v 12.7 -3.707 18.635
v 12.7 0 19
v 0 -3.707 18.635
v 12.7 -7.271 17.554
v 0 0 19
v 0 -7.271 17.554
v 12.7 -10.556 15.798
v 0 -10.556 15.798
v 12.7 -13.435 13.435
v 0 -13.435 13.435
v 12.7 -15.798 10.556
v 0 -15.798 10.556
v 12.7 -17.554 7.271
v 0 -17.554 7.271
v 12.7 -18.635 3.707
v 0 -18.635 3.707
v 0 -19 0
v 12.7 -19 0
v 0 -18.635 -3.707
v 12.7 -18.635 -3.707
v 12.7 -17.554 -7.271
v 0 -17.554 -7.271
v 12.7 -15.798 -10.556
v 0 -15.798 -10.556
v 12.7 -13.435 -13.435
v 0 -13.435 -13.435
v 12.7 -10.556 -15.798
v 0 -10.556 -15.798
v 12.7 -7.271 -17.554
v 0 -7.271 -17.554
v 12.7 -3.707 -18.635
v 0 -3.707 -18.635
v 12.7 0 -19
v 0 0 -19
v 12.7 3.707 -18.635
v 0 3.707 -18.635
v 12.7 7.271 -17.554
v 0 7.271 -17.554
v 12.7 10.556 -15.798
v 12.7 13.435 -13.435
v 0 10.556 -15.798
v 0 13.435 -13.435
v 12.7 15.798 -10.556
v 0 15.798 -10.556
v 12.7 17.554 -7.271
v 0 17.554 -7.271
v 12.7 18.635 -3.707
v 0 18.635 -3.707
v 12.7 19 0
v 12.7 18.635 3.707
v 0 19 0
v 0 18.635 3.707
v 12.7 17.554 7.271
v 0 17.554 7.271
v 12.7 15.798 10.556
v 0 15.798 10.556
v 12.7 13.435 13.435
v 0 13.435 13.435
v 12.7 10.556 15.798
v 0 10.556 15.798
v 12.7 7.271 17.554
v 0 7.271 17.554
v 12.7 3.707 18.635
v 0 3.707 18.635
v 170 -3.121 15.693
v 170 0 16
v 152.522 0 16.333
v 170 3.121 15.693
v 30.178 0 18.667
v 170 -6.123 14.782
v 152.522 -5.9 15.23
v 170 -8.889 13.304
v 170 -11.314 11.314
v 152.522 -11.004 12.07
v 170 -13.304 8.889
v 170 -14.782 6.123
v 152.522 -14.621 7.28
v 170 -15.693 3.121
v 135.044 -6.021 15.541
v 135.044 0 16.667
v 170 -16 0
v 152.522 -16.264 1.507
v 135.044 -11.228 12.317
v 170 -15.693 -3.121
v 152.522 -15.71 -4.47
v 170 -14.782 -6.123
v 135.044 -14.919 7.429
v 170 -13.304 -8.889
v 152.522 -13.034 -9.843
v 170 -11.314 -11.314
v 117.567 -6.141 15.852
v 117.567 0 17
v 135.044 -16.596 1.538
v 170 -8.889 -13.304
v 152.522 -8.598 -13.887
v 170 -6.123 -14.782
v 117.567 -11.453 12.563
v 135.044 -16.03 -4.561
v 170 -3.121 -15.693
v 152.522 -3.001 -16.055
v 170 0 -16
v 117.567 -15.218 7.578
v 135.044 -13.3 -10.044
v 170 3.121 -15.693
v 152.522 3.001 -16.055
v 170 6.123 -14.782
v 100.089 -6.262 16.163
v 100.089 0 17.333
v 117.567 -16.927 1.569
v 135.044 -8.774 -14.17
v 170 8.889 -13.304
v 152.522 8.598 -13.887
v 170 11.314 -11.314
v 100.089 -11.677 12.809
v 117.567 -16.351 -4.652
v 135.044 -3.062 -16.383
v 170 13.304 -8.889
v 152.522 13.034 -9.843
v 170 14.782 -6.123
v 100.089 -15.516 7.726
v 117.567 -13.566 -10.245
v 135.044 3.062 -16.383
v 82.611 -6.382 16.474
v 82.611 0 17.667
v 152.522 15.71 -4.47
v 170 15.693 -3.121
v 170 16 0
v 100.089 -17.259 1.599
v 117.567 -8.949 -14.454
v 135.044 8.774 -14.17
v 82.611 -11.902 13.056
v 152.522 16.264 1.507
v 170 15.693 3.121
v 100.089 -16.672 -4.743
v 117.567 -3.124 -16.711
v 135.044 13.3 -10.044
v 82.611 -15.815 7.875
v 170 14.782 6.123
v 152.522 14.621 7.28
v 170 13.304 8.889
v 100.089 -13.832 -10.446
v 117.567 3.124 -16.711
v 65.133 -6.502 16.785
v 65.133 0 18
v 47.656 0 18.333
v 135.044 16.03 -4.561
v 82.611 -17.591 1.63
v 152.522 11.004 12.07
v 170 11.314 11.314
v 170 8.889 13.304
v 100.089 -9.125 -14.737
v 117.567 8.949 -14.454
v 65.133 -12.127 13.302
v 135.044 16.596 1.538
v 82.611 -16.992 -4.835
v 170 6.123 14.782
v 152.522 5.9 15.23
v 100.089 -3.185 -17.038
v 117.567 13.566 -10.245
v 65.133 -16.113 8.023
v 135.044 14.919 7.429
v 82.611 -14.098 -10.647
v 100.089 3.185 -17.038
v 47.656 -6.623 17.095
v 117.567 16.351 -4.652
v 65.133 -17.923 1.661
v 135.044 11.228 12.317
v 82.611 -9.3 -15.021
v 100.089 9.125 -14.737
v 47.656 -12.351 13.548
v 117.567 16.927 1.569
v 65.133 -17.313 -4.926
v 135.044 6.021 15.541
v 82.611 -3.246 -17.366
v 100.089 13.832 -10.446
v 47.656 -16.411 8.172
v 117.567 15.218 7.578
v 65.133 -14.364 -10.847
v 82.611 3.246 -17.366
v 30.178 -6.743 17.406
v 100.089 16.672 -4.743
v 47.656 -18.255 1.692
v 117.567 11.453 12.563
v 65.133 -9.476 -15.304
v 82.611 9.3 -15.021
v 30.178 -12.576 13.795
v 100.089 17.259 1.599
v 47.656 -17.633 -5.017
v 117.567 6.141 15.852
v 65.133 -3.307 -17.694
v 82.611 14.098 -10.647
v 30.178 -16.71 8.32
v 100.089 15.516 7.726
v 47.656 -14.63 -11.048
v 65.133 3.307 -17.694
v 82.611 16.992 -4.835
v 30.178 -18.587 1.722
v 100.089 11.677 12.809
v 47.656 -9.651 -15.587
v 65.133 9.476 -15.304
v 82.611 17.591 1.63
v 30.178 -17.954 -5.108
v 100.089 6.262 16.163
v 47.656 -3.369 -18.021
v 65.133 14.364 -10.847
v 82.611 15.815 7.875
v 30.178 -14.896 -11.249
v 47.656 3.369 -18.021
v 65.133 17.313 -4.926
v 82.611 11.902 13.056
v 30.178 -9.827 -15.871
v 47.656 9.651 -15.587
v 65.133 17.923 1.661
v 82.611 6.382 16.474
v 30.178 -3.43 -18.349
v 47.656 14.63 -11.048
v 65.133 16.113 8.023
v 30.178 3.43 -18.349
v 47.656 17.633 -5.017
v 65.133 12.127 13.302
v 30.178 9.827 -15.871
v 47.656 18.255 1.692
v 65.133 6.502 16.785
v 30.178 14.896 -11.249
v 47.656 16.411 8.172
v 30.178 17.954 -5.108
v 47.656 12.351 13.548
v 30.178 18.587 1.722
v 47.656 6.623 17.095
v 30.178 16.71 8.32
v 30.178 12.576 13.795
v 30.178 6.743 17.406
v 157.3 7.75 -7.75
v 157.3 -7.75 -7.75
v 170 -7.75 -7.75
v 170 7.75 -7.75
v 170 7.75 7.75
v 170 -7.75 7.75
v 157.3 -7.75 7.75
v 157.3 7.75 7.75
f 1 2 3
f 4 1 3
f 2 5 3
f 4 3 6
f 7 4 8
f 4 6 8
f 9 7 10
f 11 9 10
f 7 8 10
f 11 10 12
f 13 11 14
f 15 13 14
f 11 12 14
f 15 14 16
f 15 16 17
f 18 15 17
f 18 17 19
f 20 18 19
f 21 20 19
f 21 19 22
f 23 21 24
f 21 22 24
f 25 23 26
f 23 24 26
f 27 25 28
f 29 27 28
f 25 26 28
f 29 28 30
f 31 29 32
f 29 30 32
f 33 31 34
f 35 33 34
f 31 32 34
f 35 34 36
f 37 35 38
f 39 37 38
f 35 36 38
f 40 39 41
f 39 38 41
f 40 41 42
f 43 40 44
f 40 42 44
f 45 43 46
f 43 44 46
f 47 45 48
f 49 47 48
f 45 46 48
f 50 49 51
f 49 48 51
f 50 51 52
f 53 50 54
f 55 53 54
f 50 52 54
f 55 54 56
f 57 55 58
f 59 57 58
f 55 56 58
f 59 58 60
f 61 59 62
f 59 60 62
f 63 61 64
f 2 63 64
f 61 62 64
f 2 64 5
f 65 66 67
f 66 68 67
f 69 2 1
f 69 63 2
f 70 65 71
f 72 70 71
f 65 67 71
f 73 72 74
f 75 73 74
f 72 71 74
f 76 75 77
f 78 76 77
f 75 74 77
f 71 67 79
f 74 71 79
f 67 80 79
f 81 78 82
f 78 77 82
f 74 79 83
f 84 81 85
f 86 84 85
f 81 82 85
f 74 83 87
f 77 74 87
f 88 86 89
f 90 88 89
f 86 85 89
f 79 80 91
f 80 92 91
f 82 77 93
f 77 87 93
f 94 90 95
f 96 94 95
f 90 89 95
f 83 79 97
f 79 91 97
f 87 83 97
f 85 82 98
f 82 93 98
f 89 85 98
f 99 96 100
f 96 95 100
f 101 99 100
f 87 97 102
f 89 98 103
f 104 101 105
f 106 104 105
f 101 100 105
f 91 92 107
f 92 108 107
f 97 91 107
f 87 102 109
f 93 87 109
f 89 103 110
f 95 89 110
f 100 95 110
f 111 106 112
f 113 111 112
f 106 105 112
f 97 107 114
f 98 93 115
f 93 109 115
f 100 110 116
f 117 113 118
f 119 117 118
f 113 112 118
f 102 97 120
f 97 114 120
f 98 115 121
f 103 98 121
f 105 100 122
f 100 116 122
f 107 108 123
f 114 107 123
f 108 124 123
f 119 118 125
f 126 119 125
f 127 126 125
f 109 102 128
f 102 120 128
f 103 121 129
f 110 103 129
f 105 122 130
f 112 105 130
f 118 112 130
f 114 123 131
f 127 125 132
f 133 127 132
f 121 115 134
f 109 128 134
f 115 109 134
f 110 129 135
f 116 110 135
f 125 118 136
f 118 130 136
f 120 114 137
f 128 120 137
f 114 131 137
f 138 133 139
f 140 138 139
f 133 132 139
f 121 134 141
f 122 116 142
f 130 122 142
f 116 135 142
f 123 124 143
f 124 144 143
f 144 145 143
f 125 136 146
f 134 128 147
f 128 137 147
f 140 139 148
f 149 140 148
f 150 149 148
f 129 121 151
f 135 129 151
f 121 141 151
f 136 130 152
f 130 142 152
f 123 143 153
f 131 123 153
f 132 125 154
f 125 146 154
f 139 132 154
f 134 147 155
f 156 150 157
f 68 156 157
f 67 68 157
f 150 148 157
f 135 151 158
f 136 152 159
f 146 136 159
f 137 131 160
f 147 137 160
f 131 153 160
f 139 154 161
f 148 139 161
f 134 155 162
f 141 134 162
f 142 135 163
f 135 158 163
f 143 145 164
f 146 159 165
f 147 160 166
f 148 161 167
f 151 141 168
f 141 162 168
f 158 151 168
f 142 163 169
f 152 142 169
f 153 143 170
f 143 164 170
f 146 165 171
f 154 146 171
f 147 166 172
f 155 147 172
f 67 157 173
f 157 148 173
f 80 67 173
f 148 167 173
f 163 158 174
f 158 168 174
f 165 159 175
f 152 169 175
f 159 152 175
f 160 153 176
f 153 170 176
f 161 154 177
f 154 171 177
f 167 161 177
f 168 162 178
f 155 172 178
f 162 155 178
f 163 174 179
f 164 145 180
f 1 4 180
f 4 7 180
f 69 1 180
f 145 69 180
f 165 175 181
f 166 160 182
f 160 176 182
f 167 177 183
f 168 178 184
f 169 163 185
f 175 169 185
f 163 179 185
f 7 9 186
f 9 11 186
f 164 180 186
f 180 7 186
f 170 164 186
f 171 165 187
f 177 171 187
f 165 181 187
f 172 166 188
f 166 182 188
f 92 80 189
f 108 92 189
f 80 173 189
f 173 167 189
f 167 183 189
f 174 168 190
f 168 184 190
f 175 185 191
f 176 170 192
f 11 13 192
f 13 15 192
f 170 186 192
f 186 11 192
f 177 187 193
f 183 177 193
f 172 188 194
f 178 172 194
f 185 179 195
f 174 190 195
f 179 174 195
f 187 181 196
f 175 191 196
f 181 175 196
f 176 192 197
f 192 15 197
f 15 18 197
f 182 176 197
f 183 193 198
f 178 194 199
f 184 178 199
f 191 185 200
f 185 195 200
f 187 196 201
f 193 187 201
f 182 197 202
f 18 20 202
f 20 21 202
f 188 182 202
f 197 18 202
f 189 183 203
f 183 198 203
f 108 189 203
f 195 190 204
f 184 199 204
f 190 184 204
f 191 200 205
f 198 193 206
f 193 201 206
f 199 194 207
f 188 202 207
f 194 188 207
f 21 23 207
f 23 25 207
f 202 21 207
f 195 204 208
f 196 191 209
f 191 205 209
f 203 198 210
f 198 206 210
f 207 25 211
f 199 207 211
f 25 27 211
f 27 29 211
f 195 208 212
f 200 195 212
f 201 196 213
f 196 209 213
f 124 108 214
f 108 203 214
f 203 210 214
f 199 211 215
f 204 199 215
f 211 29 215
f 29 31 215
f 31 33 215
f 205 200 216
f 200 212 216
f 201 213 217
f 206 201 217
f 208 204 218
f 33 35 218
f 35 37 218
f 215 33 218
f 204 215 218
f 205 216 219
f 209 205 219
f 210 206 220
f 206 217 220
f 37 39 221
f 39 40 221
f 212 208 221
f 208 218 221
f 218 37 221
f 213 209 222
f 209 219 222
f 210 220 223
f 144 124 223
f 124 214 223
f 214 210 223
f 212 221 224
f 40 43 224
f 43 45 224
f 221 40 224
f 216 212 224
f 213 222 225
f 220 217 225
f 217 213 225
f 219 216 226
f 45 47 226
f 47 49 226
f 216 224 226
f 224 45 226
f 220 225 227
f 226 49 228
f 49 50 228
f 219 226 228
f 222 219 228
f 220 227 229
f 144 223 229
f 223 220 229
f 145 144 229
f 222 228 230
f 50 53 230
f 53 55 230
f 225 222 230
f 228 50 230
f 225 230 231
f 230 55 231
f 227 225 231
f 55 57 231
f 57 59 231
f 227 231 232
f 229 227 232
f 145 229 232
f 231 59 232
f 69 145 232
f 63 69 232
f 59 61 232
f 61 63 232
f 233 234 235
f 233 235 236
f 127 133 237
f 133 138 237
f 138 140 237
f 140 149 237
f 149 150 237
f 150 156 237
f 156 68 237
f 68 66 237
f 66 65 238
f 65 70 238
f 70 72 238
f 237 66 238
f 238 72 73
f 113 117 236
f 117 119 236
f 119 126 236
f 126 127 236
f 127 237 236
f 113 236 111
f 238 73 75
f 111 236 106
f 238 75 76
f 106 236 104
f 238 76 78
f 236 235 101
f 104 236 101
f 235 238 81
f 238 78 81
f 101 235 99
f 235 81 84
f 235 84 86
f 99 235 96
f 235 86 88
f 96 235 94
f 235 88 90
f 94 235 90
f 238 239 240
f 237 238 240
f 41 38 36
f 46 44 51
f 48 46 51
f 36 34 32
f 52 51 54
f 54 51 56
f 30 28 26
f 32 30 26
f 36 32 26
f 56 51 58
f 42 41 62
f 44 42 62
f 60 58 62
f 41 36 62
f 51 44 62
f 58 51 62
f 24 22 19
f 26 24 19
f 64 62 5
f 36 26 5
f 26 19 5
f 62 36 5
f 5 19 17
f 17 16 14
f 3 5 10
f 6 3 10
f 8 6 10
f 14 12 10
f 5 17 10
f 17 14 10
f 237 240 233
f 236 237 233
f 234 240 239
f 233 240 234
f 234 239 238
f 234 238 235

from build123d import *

# Parameters (mm, degrees)
CUT_EXTRUDE1_DEPTH      = 173.110429667
CUT_EXTRUDE1_DEPTH_BACK = 12.7
SKETCH2_W               = 15.5
SKETCH2_H               = 15.5


with BuildPart() as part:
    # Sketch1 → Revolve1 (revolve)
    with BuildSketch(Plane.XY, mode=Mode.PRIVATE) as revolve1_sk:
        Polygon((0, 0), (170, 0), (170, 16), (12.7, 19), (0, 19), align=None)
    revolve(revolve1_sk.sketch.rotate(Axis((0, 0, 0), (1, 0, 0)), 90), axis=Axis((0, 0, 0), (1, 0, 0)))

    # Sketch2 → Cut-Extrude1 (cut, two sides: drawn at the far end of the back side and taken through both)
    with BuildSketch(Plane(origin=(170, 0, 0), x_dir=(0, 0, -1), z_dir=(1, 0, 0)).offset(-CUT_EXTRUDE1_DEPTH_BACK)):
        Rectangle(SKETCH2_W, SKETCH2_H)
    extrude(amount=CUT_EXTRUDE1_DEPTH + CUT_EXTRUDE1_DEPTH_BACK, mode=Mode.SUBTRACT)


solid = part.part
